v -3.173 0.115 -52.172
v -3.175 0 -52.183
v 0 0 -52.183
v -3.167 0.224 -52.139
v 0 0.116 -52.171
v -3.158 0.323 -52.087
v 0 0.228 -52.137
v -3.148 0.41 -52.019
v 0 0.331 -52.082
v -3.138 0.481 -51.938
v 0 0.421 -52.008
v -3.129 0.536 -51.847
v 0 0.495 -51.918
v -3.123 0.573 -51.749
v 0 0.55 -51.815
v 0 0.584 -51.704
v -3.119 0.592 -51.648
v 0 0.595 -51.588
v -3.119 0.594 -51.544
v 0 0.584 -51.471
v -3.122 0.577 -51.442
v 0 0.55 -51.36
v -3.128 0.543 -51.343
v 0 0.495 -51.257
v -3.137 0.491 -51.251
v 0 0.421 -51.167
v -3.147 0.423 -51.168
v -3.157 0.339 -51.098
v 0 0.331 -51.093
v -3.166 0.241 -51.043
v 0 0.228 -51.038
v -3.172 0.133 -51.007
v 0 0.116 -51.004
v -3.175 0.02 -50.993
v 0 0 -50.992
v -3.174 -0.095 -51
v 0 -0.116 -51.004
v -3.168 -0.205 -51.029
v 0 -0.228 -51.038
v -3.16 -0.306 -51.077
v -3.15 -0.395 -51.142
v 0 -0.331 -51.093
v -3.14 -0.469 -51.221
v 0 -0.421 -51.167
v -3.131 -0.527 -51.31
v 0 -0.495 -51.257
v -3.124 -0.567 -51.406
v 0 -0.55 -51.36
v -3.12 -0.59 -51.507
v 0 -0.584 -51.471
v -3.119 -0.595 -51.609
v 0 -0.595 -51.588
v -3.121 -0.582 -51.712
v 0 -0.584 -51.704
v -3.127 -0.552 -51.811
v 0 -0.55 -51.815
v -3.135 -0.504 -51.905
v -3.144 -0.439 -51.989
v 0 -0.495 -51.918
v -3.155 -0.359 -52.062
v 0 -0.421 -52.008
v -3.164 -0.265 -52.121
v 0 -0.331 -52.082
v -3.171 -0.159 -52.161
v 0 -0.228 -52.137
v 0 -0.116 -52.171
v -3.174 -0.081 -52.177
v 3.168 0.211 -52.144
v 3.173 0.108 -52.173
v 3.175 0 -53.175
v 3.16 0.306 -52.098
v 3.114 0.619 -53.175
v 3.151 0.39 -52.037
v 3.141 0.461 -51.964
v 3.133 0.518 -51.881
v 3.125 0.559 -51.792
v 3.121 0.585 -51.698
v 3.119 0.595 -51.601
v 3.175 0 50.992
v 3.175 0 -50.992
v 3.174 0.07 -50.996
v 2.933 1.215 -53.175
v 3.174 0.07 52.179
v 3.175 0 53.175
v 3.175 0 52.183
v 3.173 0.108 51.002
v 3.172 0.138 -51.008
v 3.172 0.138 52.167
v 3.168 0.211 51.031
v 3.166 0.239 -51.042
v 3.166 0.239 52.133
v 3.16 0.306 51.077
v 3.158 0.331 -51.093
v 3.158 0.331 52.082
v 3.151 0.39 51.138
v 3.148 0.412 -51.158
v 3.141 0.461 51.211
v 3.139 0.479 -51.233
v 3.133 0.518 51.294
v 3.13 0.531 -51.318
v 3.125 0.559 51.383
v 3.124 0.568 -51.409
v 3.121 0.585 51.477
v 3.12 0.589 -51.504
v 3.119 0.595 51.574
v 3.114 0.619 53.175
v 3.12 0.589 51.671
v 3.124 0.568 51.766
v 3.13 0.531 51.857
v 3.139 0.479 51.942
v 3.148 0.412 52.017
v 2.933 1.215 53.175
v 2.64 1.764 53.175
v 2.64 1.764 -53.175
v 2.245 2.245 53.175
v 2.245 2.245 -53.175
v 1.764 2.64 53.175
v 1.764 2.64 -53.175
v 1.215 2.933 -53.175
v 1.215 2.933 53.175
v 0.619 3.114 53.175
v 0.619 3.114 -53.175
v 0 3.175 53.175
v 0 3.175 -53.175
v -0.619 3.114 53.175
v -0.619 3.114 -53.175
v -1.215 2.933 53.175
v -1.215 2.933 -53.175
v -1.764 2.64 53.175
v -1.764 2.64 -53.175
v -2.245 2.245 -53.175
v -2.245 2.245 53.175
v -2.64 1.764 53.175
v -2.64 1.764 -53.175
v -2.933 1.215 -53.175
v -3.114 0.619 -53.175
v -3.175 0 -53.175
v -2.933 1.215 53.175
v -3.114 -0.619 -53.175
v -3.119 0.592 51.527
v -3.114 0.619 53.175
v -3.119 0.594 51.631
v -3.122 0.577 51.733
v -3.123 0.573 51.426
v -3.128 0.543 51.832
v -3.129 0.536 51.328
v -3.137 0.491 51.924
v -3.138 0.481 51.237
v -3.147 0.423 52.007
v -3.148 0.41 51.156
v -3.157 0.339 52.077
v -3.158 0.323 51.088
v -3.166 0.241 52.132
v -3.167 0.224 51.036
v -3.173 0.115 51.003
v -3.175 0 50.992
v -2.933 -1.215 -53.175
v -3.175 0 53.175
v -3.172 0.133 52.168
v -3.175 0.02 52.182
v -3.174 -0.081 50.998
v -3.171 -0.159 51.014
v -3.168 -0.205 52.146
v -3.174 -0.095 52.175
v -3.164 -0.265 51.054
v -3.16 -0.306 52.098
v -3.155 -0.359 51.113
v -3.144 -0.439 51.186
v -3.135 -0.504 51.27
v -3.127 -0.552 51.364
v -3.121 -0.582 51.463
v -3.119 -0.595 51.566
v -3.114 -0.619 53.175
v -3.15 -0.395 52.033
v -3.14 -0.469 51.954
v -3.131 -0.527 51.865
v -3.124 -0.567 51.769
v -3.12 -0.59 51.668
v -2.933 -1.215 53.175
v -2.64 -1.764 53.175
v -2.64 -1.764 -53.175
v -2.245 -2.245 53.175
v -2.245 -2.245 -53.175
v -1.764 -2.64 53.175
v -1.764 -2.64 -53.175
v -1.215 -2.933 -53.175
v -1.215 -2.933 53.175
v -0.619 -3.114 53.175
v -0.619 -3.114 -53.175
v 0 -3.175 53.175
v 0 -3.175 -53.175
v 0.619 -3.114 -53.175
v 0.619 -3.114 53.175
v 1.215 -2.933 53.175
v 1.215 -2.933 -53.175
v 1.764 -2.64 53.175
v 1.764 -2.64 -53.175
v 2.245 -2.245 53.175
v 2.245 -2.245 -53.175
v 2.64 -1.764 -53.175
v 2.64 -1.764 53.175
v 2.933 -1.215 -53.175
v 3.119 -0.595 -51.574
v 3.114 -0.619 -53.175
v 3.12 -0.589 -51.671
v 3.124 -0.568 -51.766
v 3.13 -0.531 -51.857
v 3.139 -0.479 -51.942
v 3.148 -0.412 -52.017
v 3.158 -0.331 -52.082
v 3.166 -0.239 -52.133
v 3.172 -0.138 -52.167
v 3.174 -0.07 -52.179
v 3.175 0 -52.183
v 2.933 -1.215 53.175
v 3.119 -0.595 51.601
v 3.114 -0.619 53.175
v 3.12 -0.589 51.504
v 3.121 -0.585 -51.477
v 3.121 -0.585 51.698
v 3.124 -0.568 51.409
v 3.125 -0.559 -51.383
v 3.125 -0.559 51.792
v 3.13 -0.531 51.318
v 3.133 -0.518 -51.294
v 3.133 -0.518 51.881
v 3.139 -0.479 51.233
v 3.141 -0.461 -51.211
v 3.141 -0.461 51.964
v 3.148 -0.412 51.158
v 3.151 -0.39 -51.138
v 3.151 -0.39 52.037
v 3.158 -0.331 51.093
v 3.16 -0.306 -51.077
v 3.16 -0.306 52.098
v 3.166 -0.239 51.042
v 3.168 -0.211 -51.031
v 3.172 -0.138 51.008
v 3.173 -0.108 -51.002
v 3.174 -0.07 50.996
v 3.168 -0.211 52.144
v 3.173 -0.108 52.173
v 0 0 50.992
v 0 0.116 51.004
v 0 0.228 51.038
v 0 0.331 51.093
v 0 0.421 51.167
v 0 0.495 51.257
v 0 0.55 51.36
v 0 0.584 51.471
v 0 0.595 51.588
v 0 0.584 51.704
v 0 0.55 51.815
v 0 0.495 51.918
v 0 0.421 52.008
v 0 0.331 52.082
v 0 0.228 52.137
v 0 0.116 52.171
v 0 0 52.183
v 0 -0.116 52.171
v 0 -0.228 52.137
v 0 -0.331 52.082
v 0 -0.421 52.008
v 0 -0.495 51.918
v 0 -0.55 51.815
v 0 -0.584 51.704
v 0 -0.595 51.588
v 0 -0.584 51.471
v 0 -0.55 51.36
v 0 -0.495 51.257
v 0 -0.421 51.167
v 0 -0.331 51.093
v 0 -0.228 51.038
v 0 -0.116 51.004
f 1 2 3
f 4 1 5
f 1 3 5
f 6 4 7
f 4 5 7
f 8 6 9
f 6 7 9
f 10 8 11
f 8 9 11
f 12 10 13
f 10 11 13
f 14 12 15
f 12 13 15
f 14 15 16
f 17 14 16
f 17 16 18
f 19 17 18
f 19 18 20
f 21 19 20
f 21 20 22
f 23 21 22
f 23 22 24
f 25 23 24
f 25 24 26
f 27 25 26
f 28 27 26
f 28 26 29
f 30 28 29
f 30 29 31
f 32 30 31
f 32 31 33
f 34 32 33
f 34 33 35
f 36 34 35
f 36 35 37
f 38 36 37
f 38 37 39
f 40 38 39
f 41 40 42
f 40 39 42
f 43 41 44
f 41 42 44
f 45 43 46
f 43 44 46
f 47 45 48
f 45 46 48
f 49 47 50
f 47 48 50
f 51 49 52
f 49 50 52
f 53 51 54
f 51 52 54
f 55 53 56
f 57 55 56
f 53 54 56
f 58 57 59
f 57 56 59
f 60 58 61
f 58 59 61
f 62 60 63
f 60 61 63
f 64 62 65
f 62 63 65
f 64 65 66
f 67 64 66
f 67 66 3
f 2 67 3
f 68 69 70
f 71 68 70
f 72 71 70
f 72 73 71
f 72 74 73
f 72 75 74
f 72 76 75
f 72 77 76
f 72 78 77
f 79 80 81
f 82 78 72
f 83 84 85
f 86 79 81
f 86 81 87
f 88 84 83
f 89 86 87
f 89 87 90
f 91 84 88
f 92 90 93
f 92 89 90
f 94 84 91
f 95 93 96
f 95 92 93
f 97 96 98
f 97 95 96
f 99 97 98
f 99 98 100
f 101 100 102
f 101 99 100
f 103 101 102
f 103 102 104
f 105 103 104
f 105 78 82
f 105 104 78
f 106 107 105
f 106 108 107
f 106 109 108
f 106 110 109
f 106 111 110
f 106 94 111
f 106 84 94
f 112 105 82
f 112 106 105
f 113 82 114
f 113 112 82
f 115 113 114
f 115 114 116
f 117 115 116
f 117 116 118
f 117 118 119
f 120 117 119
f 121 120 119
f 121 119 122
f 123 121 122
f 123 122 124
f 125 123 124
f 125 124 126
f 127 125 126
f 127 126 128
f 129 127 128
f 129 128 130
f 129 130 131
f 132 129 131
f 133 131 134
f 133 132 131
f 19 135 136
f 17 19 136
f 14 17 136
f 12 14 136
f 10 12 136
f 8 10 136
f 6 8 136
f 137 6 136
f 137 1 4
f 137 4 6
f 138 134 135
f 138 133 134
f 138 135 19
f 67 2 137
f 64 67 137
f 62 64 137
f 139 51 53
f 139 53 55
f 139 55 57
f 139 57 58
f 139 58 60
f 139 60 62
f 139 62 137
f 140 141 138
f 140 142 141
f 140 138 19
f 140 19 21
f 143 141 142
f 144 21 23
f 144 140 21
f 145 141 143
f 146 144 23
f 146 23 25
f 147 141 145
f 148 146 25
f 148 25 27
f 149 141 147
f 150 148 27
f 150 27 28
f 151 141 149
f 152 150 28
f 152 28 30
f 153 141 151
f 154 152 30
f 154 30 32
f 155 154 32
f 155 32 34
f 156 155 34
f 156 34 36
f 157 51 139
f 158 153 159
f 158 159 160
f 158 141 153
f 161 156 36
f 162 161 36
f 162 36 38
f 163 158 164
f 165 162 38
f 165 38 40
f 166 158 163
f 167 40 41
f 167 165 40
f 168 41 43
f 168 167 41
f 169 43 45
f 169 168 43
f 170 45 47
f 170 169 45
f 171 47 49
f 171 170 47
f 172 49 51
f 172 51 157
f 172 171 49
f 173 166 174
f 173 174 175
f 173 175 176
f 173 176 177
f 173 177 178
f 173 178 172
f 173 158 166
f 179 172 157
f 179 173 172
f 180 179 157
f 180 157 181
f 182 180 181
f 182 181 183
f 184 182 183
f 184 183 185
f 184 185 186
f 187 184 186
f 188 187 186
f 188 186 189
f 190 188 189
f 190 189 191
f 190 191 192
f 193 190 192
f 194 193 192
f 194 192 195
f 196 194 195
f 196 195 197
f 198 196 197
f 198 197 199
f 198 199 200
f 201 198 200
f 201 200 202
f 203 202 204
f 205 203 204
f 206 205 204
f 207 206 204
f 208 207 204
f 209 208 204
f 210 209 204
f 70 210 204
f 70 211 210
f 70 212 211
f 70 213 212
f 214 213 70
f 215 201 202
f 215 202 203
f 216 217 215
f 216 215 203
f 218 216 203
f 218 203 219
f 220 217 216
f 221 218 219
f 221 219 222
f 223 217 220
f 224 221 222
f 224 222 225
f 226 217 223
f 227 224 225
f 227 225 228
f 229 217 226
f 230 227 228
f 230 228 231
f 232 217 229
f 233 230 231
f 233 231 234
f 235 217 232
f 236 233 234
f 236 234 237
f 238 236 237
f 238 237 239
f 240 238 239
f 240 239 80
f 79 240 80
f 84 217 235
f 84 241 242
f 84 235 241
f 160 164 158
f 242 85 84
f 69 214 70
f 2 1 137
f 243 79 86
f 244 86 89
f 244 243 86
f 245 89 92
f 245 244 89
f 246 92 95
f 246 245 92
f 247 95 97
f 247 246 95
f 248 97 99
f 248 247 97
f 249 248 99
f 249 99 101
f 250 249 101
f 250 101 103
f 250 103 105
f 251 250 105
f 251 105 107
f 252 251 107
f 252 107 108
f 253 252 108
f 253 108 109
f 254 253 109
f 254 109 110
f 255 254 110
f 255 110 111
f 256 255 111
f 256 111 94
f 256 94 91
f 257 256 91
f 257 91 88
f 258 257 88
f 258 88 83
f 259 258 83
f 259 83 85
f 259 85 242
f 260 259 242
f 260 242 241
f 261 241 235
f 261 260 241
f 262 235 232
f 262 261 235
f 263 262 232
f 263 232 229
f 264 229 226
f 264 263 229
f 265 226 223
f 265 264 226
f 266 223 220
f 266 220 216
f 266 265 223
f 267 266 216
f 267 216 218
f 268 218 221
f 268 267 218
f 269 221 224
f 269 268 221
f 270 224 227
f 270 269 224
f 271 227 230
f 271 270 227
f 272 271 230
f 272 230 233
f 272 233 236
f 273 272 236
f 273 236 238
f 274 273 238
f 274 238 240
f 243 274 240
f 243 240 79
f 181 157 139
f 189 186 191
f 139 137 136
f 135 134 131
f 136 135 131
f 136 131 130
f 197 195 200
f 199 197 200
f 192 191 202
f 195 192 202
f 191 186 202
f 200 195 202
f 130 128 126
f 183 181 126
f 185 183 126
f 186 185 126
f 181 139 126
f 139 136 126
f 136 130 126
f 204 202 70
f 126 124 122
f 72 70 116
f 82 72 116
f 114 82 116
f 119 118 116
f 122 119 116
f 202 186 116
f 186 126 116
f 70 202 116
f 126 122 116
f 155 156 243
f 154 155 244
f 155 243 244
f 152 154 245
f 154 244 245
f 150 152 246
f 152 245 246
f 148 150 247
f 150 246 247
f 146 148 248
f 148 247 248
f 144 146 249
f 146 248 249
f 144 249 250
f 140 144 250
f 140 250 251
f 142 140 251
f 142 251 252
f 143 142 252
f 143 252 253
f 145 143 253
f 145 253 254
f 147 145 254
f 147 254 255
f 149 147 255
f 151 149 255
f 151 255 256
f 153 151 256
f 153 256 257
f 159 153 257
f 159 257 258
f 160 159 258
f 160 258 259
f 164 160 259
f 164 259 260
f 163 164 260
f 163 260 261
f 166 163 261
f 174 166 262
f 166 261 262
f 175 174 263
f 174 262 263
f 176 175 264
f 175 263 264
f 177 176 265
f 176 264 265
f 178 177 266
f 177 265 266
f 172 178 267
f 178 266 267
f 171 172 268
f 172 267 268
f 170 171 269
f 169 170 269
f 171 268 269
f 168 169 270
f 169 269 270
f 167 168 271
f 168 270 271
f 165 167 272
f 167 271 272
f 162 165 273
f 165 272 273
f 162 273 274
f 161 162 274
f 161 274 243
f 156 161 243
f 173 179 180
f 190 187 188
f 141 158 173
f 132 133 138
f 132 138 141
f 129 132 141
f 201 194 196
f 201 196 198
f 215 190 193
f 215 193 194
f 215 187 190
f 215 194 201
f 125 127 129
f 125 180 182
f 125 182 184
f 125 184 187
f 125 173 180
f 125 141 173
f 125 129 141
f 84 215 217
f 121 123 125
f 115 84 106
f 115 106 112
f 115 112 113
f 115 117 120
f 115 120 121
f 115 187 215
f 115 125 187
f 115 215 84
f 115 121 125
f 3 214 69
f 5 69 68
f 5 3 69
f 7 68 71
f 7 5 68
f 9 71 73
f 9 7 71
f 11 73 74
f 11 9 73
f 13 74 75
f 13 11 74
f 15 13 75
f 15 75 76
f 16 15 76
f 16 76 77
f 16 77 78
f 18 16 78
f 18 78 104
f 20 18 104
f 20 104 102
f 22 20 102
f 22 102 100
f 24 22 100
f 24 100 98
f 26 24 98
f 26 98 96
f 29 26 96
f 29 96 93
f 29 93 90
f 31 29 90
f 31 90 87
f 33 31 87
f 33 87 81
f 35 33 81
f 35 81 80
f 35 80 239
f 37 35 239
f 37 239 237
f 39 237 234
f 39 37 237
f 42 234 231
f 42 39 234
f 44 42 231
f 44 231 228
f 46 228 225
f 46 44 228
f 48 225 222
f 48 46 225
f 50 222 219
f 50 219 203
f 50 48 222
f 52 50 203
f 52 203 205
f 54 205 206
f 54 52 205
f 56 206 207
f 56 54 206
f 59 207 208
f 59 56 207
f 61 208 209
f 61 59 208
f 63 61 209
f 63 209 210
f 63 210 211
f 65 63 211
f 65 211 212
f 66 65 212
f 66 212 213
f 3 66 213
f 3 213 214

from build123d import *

# Parameters (mm, degrees)
SKETCH2_R               = 3.175
BOSS_EXTRUDE1_DEPTH     = 50
SKETCH3_R               = 3.175
BOSS_EXTRUDE2_DEPTH     = 3.175
SKETCH5_R               = 0.5953125
CUT_EXTRUDE1_DEPTH      = 4.175
CUT_EXTRUDE1_DEPTH_BACK = 4.175


with BuildPart() as part:
    # Sketch2 → Boss-Extrude1 (new body)
    with BuildSketch(Plane.XY):
        Circle(SKETCH2_R)
    boss_extrude1 = extrude(amount=BOSS_EXTRUDE1_DEPTH)

    # Sketch3 → Boss-Extrude2 (add)
    with BuildSketch(Plane.XY.offset(50)):
        Circle(SKETCH3_R)
    boss_extrude2 = extrude(amount=BOSS_EXTRUDE2_DEPTH)

    # Mirror1: Boss-Extrude1, Boss-Extrude2 across plane
    add(boss_extrude1.mirror(Plane.XY))
    add(boss_extrude2.mirror(Plane.XY))

    # Sketch5 → Cut-Extrude1 (cut, two sides)
    with BuildSketch(Plane(origin=(0, 0, 0), x_dir=(0, 0, -1), z_dir=(1, 0, 0))) as cut_extrude1_sk:
        with Locations((-51.5875, 0)):
            Circle(SKETCH5_R)
        with Locations((51.5875, 0)):
            Circle(SKETCH5_R)
    extrude(amount=CUT_EXTRUDE1_DEPTH, mode=Mode.SUBTRACT)
    extrude(cut_extrude1_sk.sketch, amount=-CUT_EXTRUDE1_DEPTH_BACK, mode=Mode.SUBTRACT)


solid = part.part
